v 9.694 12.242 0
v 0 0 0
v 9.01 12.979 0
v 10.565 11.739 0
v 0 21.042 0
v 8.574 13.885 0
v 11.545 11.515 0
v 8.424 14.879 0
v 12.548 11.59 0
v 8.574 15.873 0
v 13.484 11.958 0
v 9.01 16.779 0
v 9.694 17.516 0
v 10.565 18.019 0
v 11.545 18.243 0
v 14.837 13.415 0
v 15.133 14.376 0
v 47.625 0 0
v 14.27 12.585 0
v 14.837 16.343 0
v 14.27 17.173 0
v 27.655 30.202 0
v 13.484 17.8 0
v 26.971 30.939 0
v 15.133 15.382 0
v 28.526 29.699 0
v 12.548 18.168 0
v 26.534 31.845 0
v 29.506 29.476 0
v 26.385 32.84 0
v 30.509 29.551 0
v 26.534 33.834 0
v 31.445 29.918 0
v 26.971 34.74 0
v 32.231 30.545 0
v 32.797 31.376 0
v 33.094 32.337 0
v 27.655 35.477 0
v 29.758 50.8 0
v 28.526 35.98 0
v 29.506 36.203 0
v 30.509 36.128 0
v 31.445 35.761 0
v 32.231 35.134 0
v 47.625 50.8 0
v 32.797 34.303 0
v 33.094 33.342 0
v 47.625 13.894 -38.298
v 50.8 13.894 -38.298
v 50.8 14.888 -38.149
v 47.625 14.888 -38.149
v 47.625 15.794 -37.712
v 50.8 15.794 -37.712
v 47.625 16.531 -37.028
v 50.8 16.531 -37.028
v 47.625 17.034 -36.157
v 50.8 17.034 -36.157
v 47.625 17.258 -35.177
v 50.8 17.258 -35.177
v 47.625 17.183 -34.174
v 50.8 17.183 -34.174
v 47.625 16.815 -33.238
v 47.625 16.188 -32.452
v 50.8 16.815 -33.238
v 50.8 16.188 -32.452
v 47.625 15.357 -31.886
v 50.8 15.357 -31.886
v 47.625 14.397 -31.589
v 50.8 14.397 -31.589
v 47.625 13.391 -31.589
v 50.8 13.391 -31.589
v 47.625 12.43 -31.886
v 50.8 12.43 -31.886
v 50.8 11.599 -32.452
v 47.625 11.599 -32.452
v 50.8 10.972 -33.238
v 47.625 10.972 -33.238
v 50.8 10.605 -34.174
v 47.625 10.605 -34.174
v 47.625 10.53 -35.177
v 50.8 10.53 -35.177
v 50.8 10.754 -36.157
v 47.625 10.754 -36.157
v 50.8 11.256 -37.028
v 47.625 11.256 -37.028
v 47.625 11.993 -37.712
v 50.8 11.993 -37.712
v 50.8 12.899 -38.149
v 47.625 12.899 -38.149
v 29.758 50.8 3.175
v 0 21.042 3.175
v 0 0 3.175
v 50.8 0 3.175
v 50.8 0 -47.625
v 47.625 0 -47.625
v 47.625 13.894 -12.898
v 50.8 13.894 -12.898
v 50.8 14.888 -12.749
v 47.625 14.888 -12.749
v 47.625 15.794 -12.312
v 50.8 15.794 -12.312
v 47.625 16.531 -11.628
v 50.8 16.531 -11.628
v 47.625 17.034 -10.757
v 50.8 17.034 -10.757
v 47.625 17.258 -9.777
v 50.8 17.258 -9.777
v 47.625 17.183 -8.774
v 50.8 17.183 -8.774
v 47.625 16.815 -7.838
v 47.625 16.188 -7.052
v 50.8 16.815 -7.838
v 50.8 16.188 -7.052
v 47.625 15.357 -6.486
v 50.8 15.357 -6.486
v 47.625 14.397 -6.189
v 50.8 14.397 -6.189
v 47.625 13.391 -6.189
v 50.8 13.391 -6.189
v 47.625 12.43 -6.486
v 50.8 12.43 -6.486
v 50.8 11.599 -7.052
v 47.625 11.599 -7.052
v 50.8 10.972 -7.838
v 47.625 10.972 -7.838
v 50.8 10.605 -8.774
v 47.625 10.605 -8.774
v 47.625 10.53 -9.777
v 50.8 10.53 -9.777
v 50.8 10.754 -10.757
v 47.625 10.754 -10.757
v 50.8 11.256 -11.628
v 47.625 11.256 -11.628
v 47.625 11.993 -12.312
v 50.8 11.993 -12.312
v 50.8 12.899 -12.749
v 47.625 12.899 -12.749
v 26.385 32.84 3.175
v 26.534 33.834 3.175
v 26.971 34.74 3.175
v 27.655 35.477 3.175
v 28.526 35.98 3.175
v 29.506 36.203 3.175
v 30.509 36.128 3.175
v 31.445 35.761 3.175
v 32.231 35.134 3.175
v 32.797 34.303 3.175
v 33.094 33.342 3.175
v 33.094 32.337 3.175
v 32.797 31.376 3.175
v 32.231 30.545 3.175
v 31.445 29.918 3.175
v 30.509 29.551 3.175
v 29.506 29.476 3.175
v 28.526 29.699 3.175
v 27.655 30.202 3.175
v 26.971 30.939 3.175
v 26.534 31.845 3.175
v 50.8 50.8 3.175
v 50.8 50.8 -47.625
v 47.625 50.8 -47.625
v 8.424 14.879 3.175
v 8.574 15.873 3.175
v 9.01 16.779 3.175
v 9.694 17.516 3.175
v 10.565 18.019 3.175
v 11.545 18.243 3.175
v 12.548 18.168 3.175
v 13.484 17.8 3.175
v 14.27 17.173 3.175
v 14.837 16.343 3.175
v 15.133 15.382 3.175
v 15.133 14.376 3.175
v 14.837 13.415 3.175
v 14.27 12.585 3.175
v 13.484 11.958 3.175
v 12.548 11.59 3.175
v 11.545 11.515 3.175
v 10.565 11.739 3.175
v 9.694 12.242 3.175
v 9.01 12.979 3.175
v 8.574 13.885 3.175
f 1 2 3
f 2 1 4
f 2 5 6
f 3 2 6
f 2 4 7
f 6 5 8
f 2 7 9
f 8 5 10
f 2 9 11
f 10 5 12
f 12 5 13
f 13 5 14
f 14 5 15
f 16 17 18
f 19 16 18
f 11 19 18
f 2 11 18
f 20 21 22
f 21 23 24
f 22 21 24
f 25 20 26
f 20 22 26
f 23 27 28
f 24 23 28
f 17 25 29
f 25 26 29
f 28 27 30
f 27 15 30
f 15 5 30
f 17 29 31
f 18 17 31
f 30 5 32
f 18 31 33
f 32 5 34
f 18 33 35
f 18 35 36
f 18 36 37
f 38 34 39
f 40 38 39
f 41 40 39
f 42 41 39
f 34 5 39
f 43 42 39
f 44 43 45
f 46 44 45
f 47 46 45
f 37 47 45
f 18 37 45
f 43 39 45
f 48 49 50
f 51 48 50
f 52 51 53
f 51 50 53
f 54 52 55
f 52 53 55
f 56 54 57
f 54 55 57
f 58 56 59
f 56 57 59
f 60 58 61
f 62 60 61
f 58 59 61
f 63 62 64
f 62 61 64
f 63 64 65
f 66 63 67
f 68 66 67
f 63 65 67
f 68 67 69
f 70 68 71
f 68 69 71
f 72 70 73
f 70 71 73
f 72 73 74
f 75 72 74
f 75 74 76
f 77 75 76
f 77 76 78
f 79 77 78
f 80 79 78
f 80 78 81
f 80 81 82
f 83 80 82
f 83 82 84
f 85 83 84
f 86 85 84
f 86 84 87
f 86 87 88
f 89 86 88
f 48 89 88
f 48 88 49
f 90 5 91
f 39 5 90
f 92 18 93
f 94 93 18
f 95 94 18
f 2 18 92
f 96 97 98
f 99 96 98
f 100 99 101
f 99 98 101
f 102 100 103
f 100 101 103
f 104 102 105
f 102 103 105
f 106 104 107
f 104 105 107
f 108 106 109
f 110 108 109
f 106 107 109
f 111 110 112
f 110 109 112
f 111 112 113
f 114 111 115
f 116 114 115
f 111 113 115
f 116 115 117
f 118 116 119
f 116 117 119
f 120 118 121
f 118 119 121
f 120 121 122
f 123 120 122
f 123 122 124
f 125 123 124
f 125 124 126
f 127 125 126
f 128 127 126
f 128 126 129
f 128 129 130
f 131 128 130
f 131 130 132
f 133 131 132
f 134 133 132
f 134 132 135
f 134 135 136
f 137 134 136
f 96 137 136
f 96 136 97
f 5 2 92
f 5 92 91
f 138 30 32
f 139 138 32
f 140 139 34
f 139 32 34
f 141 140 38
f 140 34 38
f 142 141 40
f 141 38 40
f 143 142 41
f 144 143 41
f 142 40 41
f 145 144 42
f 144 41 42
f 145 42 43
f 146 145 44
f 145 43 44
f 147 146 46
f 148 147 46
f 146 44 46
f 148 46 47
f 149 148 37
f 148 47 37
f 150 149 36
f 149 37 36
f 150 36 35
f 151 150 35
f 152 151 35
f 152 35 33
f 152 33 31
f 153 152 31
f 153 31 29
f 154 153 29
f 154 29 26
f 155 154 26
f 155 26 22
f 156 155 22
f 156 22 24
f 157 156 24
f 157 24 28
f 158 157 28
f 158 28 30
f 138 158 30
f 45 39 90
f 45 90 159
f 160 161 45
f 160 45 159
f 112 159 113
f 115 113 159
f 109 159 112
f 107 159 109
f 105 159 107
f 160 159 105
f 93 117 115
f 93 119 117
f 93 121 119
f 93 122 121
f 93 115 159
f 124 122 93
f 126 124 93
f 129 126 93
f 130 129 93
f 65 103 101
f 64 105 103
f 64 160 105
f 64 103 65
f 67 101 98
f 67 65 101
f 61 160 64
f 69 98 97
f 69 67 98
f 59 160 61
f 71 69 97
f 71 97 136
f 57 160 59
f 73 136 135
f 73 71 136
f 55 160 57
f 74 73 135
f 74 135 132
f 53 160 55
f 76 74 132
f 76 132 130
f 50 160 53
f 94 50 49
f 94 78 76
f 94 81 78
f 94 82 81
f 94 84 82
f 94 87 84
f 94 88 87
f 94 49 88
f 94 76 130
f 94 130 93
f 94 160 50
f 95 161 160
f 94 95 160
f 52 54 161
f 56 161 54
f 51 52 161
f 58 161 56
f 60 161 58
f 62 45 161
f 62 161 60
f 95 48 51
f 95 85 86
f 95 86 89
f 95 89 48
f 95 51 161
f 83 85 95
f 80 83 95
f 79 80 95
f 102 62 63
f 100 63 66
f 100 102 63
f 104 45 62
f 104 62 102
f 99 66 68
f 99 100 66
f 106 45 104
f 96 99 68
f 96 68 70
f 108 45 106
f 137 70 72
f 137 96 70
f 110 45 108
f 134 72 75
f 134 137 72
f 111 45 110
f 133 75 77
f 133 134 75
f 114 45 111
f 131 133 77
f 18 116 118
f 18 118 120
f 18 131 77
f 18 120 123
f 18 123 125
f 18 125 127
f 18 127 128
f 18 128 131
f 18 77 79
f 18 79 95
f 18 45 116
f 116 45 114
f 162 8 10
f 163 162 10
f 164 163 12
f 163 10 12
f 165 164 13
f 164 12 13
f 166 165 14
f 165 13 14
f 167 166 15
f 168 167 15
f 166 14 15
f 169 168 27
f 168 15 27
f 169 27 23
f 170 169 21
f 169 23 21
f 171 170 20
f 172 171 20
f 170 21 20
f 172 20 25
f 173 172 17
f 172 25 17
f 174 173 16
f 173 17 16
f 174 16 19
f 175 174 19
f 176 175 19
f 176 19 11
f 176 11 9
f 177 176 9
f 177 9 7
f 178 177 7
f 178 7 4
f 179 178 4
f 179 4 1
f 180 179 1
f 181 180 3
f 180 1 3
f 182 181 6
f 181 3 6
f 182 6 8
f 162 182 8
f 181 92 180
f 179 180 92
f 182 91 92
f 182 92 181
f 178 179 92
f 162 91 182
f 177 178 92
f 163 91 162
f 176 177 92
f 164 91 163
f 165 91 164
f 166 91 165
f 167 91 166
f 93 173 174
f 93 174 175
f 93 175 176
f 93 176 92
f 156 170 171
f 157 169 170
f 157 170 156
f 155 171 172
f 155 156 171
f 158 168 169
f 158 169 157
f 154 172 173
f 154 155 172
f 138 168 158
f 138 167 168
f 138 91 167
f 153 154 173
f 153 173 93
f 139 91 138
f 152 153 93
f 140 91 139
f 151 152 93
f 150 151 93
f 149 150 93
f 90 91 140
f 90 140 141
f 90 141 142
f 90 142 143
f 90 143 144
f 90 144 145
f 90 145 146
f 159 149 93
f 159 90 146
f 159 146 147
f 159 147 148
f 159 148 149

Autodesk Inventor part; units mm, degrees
ref_plane "YZ Plane" through (0, 0, 0) normal (1, 0, 0) x (0, 1, 0)
ref_plane "XZ Plane" through (0, 0, 0) normal (0, 1, 0) x (-1, 0, 0)
ref_plane "XY Plane" through (0, 0, 0) normal (0, 0, 1) x (1, 0, 0)
sketch "Sketch1" plane through (0, 0, 0) normal (0, 0, 1) x (1, 0, 0)
  line L0 (0, 0) -> (0, 21.042)
  line L1 (0, 21.042) -> (29.758, 50.8)
  line L2 (29.758, 50.8) -> (50.8, 50.8)
  line L3 (50.8, 50.8) -> (50.8, 0)
  line L4 (50.8, 0) -> (0, 0)
  dimension "d0" = 50.8
  dimension "d2" = 50.8
  dimension "d3" = 50.8
  dimension "d4" = 135
extrude "Extrusion1" add sketch "Sketch1" along normal blind 3.175
sketch "Sketch2" plane through (0, 0, 3.175) normal (0, 0, 1) x (1, 0, 0)
  line L0 (50.8, 0) -> (50.8, 50.8) projected
  line L1 (0, 0) -> (50.8, 0) projected
  line L2 (50.8, 50.8) -> (47.625, 50.8)
  line L3 (47.625, 50.8) -> (47.625, 0)
  line L4 (47.625, 0) -> (50.8, 0)
  line L5 (50.8, 0) -> (50.8, 50.8)
  dimension "d7" = 3.175
extrude "Extrusion2" add sketch "Sketch2" against normal blind 50.8
sketch "Sketch3" plane through (50.8, 0, 3.175) normal (1, 0, 0) x (0, 0, -1)
  circle A0 centre (38.1, 13.8938) radius 3.3734
  circle A1 centre (12.7, 13.8938) radius 3.3734
  line L0 (0, 50.8) -> (50.8, 50.8) projected
  line L1 (0, 0) -> (0, 50.8) projected
  line L2 (0, 0) -> (50.8, 0) projected
  point P0 (3.175, 0)
  dimension "d10" = 6.7469
  dimension "d11" = 6.7469
  dimension "d14" = 12.7
  dimension "d15" = 25.4
  dimension "d25" = 13.8938
  dimension "d26" = 13.8938
extrude "Extrusion3" cut sketch "Sketch3" against normal blind 3.175
sketch "Sketch5" plane through (0, 0, 0) normal (0, 0, -1) x (-1, 0, 0)
  circle A0 centre (-11.7974, 14.879) radius 3.3734
  circle A1 centre (-29.758, 32.8395) radius 3.3734
  line L0 (0, 21.042) -> (-29.758, 50.8) projected
  line L1 (-29.758, 50.8) -> (-47.7185, 32.8395) construction
  point P0 (0, 0)
  dimension "d27" = 6.7469
  dimension "d28" = 6.7469
  dimension "d29" = 12.7
  dimension "d30" = 12.7
  dimension "d31" = 25.4
  dimension "d32" = 25.4
  dimension "d33" = 12.7
extrude "Extrusion5" cut sketch "Sketch5" against normal blind 3.175
properties part number "bottom left rail gusset" material "Aluminum 6061"
